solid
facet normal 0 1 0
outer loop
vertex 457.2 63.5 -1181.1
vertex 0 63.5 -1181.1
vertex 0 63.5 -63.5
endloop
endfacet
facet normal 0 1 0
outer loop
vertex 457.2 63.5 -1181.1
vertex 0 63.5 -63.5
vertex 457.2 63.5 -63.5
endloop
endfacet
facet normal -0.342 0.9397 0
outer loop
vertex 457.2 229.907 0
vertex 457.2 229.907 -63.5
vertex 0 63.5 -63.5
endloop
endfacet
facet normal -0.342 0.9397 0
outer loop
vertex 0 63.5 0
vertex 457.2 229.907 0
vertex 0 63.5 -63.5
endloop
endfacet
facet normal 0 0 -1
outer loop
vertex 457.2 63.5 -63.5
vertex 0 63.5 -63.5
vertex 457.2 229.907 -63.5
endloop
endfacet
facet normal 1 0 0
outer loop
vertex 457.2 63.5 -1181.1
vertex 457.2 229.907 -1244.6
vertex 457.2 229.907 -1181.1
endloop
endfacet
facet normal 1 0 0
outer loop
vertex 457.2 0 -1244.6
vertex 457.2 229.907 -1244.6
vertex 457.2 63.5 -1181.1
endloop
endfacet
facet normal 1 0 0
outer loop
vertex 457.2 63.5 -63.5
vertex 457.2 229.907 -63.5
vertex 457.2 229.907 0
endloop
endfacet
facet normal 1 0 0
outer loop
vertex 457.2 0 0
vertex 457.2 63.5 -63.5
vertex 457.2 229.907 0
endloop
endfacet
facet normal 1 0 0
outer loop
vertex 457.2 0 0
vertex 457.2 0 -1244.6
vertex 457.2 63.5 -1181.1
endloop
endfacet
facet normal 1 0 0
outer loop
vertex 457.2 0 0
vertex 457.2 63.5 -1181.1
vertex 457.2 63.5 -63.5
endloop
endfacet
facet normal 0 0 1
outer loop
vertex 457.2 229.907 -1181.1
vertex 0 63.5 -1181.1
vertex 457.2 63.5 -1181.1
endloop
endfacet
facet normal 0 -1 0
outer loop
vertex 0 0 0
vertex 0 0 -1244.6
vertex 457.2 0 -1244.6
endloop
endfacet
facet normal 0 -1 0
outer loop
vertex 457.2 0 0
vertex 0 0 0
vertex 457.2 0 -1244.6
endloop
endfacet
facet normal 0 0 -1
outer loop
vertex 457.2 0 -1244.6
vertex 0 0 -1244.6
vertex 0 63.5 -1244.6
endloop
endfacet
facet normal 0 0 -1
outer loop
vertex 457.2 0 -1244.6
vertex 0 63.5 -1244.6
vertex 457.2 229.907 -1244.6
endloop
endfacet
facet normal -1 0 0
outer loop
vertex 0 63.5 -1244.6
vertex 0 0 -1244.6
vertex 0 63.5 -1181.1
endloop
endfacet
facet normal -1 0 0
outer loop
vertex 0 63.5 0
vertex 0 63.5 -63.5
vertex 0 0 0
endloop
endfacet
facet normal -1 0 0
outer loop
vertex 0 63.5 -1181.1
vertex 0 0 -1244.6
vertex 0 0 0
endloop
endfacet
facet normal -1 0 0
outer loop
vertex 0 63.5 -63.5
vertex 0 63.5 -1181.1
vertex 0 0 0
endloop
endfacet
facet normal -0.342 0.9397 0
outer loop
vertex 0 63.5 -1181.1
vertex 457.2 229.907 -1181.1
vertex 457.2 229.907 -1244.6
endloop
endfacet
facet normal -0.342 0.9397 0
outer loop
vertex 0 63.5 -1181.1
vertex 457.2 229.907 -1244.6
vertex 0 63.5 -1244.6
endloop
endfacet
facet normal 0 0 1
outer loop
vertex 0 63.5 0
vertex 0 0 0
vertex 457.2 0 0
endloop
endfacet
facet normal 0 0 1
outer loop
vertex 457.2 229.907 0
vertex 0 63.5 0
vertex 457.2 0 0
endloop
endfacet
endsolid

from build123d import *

# Parameters (mm, degrees)
SKETCH1_W           = 457.2
SKETCH1_H           = 1244.6
BOSS_EXTRUDE1_DEPTH = 63.5
SKETCH4_W           = 457.2
SKETCH4_H           = 63.5
BOSS_EXTRUDE2_DEPTH = 266.7
CUT_EXTRUDE7_DEPTH  = 100.076


with BuildPart() as part:
    # Sketch1 → Boss-Extrude1 (new body)
    with BuildSketch(Plane(origin=(0, 0, 0), x_dir=(1, 0, 0), z_dir=(0, 1, 0))):
        with Locations((228.6, 622.3)):
            Rectangle(SKETCH1_W, SKETCH1_H)
    extrude(amount=BOSS_EXTRUDE1_DEPTH)

    # Sketch4 → Boss-Extrude2 (add)
    with BuildSketch(Plane(origin=(0, 63.5, 0), x_dir=(1, 0, 0), z_dir=(0, 1, 0))):
        with Locations((228.6, 1212.85)):
            Rectangle(SKETCH4_W, SKETCH4_H)
    boss_extrude2 = extrude(amount=BOSS_EXTRUDE2_DEPTH)

    # Mirror7: Boss-Extrude2 across plane
    add(boss_extrude2.mirror(Plane(origin=(0, 0, -622.3), x_dir=(1, 0, 0), z_dir=(0, 0, -1))))

    # Sketch11 → Cut-Extrude7 (cut)
    with BuildSketch(Plane.XY.offset(-1181.1)):
        Polygon((0, 63.5), (0, 330.2), (457.2, 330.2), (457.2, 229.907191107), align=None)
    cut_extrude7 = extrude(amount=-CUT_EXTRUDE7_DEPTH, mode=Mode.SUBTRACT)

    # Mirror8: Cut-Extrude7 across plane
    add(cut_extrude7.mirror(Plane(origin=(0, 0, -622.3), x_dir=(1, 0, 0), z_dir=(0, 0, -1))), mode=Mode.SUBTRACT)


solid = part.part
